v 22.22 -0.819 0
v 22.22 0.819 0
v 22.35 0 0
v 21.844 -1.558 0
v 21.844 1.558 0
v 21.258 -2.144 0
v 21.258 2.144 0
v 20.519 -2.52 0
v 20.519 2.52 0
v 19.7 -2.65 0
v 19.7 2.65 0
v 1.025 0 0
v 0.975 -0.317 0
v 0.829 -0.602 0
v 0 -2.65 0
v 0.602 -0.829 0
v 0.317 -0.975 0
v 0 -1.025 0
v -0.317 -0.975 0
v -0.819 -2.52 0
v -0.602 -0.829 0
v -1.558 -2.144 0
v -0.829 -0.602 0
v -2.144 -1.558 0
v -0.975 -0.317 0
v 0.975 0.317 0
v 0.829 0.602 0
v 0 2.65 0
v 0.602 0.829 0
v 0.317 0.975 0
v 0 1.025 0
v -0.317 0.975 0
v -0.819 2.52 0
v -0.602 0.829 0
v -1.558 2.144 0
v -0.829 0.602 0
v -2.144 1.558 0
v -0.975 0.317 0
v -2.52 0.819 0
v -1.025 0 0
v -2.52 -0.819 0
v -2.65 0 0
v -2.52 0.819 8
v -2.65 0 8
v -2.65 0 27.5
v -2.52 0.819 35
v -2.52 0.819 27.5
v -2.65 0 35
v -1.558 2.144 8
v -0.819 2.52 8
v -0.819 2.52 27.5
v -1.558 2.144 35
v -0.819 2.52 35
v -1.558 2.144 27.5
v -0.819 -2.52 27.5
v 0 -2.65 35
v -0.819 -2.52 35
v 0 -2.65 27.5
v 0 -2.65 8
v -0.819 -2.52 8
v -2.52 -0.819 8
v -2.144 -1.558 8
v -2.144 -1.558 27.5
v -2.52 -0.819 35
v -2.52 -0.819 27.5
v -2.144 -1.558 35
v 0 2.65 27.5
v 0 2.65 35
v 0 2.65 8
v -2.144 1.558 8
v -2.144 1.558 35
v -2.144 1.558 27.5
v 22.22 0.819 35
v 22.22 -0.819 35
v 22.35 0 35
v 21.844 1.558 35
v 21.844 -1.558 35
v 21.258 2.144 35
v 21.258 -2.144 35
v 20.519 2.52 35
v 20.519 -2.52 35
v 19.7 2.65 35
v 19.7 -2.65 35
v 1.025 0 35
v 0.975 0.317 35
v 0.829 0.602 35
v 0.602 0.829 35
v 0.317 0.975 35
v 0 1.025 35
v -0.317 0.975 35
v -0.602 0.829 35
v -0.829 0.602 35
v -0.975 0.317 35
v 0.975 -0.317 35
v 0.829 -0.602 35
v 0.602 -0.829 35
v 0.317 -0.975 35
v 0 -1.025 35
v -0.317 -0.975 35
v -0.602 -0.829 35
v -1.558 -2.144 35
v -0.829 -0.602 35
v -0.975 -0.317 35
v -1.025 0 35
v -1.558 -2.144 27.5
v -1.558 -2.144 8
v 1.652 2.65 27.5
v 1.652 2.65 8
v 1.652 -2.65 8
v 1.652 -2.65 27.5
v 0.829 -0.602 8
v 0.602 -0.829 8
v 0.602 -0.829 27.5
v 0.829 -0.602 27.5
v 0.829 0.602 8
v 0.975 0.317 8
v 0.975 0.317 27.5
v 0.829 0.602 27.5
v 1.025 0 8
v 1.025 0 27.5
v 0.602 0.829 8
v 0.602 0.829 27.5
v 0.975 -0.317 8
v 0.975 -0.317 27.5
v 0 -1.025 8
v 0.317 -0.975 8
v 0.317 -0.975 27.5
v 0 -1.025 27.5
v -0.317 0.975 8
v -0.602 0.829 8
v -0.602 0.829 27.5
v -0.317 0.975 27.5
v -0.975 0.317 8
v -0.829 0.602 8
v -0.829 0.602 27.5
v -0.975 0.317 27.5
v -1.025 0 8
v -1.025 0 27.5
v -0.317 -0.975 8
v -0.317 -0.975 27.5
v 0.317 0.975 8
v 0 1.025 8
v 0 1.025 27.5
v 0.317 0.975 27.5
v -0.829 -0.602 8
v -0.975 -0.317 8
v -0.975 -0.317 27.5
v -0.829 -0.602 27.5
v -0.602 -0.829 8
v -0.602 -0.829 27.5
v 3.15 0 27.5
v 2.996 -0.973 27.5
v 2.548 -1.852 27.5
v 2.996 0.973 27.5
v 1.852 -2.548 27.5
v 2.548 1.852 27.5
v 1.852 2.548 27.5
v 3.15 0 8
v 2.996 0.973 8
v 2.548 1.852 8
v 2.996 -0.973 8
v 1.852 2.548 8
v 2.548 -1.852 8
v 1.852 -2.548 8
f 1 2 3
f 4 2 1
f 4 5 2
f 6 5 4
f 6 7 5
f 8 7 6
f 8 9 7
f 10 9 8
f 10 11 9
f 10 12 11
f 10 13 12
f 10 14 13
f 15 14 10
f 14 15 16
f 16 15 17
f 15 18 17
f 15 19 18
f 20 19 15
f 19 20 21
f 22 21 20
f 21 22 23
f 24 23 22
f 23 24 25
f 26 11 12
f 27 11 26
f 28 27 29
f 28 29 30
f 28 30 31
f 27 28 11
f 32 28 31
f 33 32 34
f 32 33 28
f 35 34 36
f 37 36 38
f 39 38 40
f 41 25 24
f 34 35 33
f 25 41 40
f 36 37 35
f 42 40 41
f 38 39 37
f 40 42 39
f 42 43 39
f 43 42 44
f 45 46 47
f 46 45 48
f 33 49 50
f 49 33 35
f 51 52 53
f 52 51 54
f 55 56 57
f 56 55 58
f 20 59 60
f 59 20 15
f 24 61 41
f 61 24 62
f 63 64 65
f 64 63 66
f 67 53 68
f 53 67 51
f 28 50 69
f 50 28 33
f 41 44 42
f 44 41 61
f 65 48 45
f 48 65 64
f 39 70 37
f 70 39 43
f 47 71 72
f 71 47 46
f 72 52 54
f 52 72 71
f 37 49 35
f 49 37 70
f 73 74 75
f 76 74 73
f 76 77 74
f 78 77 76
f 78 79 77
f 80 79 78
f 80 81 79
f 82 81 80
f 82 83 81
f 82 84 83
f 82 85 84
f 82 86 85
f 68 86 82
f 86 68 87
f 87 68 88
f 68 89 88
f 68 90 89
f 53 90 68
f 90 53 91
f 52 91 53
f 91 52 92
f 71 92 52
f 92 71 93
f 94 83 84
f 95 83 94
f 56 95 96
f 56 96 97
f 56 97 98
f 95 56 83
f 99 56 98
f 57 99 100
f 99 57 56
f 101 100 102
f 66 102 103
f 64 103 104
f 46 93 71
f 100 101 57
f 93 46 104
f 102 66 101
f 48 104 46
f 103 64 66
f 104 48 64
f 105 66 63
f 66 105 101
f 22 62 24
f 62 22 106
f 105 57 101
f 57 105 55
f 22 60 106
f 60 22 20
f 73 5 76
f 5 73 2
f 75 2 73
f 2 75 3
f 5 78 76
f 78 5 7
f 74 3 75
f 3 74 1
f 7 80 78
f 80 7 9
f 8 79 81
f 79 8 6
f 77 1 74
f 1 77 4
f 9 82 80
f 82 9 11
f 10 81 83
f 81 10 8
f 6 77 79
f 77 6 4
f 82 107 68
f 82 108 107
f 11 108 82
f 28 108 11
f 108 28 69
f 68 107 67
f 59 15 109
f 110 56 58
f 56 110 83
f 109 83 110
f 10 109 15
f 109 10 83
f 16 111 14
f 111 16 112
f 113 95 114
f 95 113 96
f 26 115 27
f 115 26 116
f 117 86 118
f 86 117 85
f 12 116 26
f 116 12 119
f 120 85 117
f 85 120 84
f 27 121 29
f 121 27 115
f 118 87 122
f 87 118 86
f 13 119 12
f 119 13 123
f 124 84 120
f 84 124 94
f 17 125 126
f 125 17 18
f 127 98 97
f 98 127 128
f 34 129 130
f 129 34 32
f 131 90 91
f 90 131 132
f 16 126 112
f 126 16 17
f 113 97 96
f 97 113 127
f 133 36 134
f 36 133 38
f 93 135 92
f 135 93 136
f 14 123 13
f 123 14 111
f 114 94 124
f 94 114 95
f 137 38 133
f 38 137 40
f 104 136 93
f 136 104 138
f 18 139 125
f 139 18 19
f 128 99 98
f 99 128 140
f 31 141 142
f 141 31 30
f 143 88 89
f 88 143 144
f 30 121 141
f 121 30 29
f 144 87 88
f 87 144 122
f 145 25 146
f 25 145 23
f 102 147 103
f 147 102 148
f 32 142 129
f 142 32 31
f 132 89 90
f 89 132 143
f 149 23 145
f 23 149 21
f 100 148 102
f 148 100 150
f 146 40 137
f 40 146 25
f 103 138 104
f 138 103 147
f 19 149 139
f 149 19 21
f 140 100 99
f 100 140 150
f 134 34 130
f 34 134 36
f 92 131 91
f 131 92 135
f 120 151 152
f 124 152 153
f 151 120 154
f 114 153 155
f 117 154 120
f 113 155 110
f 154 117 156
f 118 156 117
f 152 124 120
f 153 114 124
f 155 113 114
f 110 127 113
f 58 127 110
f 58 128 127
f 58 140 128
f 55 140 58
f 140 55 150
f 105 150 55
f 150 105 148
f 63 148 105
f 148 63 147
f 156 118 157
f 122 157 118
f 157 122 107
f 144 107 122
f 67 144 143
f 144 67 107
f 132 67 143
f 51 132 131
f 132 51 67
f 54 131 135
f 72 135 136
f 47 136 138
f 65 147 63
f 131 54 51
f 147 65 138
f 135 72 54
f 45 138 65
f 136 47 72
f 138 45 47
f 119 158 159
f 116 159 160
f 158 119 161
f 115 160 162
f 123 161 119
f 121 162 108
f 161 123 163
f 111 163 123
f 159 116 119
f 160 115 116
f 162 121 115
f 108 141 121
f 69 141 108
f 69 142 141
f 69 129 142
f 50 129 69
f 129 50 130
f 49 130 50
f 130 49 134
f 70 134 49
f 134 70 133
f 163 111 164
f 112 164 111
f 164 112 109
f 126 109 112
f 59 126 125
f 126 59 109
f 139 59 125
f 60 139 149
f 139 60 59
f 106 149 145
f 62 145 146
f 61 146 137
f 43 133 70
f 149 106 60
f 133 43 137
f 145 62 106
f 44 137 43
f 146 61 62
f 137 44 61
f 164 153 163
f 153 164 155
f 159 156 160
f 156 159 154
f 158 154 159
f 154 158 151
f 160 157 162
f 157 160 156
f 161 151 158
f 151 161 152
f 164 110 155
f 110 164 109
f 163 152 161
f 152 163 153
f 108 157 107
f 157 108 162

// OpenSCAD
// file: belt_configuration.scad
belt_thickness = 5.3;
belt_height = 35;
buckle_thickness = 2;
buckle_length = 30;

$fn = 20;

cross_width = 25;
h_width = 25;
peak_width = 10;

link_height = 20;

pin_diameter = 2.05;

pin_tolerance = 0.2;

hole_diameter = 3;

mo = 0.01;


link_tolerance = 1;
link_depth = pin_diameter + 2*link_tolerance;
link_depth_height = 20;

tolerance = 1;
// main file
include <belt_configuration.scad>

module end()
{
  difference()
  {
    union()
    {
      cylinder(r=belt_thickness / 2, h=belt_height);

      translate([h_width - belt_thickness,0,0])
        cylinder(r=belt_thickness / 2, h=belt_height);

      translate([0, -belt_thickness / 2, 0])
        cube([h_width-belt_thickness, belt_thickness, belt_height]);
    }

    translate([0,0,-mo])
      cylinder(r=pin_diameter / 2, h=belt_height + 2 * mo);
  
    translate([-belt_thickness / 2, -belt_thickness / 2 - mo, belt_height/2 - link_depth_height/2+link_tolerance / 2])
      cube([link_depth-pin_diameter/4, belt_thickness + 2* mo, link_depth_height-link_tolerance/2]);

    translate([0,0, belt_height/2 - link_depth_height/2+link_tolerance / 2])
      cylinder(r=(belt_thickness+link_tolerance) / 2, h=link_depth_height-link_tolerance/2);
  }
}

end();
